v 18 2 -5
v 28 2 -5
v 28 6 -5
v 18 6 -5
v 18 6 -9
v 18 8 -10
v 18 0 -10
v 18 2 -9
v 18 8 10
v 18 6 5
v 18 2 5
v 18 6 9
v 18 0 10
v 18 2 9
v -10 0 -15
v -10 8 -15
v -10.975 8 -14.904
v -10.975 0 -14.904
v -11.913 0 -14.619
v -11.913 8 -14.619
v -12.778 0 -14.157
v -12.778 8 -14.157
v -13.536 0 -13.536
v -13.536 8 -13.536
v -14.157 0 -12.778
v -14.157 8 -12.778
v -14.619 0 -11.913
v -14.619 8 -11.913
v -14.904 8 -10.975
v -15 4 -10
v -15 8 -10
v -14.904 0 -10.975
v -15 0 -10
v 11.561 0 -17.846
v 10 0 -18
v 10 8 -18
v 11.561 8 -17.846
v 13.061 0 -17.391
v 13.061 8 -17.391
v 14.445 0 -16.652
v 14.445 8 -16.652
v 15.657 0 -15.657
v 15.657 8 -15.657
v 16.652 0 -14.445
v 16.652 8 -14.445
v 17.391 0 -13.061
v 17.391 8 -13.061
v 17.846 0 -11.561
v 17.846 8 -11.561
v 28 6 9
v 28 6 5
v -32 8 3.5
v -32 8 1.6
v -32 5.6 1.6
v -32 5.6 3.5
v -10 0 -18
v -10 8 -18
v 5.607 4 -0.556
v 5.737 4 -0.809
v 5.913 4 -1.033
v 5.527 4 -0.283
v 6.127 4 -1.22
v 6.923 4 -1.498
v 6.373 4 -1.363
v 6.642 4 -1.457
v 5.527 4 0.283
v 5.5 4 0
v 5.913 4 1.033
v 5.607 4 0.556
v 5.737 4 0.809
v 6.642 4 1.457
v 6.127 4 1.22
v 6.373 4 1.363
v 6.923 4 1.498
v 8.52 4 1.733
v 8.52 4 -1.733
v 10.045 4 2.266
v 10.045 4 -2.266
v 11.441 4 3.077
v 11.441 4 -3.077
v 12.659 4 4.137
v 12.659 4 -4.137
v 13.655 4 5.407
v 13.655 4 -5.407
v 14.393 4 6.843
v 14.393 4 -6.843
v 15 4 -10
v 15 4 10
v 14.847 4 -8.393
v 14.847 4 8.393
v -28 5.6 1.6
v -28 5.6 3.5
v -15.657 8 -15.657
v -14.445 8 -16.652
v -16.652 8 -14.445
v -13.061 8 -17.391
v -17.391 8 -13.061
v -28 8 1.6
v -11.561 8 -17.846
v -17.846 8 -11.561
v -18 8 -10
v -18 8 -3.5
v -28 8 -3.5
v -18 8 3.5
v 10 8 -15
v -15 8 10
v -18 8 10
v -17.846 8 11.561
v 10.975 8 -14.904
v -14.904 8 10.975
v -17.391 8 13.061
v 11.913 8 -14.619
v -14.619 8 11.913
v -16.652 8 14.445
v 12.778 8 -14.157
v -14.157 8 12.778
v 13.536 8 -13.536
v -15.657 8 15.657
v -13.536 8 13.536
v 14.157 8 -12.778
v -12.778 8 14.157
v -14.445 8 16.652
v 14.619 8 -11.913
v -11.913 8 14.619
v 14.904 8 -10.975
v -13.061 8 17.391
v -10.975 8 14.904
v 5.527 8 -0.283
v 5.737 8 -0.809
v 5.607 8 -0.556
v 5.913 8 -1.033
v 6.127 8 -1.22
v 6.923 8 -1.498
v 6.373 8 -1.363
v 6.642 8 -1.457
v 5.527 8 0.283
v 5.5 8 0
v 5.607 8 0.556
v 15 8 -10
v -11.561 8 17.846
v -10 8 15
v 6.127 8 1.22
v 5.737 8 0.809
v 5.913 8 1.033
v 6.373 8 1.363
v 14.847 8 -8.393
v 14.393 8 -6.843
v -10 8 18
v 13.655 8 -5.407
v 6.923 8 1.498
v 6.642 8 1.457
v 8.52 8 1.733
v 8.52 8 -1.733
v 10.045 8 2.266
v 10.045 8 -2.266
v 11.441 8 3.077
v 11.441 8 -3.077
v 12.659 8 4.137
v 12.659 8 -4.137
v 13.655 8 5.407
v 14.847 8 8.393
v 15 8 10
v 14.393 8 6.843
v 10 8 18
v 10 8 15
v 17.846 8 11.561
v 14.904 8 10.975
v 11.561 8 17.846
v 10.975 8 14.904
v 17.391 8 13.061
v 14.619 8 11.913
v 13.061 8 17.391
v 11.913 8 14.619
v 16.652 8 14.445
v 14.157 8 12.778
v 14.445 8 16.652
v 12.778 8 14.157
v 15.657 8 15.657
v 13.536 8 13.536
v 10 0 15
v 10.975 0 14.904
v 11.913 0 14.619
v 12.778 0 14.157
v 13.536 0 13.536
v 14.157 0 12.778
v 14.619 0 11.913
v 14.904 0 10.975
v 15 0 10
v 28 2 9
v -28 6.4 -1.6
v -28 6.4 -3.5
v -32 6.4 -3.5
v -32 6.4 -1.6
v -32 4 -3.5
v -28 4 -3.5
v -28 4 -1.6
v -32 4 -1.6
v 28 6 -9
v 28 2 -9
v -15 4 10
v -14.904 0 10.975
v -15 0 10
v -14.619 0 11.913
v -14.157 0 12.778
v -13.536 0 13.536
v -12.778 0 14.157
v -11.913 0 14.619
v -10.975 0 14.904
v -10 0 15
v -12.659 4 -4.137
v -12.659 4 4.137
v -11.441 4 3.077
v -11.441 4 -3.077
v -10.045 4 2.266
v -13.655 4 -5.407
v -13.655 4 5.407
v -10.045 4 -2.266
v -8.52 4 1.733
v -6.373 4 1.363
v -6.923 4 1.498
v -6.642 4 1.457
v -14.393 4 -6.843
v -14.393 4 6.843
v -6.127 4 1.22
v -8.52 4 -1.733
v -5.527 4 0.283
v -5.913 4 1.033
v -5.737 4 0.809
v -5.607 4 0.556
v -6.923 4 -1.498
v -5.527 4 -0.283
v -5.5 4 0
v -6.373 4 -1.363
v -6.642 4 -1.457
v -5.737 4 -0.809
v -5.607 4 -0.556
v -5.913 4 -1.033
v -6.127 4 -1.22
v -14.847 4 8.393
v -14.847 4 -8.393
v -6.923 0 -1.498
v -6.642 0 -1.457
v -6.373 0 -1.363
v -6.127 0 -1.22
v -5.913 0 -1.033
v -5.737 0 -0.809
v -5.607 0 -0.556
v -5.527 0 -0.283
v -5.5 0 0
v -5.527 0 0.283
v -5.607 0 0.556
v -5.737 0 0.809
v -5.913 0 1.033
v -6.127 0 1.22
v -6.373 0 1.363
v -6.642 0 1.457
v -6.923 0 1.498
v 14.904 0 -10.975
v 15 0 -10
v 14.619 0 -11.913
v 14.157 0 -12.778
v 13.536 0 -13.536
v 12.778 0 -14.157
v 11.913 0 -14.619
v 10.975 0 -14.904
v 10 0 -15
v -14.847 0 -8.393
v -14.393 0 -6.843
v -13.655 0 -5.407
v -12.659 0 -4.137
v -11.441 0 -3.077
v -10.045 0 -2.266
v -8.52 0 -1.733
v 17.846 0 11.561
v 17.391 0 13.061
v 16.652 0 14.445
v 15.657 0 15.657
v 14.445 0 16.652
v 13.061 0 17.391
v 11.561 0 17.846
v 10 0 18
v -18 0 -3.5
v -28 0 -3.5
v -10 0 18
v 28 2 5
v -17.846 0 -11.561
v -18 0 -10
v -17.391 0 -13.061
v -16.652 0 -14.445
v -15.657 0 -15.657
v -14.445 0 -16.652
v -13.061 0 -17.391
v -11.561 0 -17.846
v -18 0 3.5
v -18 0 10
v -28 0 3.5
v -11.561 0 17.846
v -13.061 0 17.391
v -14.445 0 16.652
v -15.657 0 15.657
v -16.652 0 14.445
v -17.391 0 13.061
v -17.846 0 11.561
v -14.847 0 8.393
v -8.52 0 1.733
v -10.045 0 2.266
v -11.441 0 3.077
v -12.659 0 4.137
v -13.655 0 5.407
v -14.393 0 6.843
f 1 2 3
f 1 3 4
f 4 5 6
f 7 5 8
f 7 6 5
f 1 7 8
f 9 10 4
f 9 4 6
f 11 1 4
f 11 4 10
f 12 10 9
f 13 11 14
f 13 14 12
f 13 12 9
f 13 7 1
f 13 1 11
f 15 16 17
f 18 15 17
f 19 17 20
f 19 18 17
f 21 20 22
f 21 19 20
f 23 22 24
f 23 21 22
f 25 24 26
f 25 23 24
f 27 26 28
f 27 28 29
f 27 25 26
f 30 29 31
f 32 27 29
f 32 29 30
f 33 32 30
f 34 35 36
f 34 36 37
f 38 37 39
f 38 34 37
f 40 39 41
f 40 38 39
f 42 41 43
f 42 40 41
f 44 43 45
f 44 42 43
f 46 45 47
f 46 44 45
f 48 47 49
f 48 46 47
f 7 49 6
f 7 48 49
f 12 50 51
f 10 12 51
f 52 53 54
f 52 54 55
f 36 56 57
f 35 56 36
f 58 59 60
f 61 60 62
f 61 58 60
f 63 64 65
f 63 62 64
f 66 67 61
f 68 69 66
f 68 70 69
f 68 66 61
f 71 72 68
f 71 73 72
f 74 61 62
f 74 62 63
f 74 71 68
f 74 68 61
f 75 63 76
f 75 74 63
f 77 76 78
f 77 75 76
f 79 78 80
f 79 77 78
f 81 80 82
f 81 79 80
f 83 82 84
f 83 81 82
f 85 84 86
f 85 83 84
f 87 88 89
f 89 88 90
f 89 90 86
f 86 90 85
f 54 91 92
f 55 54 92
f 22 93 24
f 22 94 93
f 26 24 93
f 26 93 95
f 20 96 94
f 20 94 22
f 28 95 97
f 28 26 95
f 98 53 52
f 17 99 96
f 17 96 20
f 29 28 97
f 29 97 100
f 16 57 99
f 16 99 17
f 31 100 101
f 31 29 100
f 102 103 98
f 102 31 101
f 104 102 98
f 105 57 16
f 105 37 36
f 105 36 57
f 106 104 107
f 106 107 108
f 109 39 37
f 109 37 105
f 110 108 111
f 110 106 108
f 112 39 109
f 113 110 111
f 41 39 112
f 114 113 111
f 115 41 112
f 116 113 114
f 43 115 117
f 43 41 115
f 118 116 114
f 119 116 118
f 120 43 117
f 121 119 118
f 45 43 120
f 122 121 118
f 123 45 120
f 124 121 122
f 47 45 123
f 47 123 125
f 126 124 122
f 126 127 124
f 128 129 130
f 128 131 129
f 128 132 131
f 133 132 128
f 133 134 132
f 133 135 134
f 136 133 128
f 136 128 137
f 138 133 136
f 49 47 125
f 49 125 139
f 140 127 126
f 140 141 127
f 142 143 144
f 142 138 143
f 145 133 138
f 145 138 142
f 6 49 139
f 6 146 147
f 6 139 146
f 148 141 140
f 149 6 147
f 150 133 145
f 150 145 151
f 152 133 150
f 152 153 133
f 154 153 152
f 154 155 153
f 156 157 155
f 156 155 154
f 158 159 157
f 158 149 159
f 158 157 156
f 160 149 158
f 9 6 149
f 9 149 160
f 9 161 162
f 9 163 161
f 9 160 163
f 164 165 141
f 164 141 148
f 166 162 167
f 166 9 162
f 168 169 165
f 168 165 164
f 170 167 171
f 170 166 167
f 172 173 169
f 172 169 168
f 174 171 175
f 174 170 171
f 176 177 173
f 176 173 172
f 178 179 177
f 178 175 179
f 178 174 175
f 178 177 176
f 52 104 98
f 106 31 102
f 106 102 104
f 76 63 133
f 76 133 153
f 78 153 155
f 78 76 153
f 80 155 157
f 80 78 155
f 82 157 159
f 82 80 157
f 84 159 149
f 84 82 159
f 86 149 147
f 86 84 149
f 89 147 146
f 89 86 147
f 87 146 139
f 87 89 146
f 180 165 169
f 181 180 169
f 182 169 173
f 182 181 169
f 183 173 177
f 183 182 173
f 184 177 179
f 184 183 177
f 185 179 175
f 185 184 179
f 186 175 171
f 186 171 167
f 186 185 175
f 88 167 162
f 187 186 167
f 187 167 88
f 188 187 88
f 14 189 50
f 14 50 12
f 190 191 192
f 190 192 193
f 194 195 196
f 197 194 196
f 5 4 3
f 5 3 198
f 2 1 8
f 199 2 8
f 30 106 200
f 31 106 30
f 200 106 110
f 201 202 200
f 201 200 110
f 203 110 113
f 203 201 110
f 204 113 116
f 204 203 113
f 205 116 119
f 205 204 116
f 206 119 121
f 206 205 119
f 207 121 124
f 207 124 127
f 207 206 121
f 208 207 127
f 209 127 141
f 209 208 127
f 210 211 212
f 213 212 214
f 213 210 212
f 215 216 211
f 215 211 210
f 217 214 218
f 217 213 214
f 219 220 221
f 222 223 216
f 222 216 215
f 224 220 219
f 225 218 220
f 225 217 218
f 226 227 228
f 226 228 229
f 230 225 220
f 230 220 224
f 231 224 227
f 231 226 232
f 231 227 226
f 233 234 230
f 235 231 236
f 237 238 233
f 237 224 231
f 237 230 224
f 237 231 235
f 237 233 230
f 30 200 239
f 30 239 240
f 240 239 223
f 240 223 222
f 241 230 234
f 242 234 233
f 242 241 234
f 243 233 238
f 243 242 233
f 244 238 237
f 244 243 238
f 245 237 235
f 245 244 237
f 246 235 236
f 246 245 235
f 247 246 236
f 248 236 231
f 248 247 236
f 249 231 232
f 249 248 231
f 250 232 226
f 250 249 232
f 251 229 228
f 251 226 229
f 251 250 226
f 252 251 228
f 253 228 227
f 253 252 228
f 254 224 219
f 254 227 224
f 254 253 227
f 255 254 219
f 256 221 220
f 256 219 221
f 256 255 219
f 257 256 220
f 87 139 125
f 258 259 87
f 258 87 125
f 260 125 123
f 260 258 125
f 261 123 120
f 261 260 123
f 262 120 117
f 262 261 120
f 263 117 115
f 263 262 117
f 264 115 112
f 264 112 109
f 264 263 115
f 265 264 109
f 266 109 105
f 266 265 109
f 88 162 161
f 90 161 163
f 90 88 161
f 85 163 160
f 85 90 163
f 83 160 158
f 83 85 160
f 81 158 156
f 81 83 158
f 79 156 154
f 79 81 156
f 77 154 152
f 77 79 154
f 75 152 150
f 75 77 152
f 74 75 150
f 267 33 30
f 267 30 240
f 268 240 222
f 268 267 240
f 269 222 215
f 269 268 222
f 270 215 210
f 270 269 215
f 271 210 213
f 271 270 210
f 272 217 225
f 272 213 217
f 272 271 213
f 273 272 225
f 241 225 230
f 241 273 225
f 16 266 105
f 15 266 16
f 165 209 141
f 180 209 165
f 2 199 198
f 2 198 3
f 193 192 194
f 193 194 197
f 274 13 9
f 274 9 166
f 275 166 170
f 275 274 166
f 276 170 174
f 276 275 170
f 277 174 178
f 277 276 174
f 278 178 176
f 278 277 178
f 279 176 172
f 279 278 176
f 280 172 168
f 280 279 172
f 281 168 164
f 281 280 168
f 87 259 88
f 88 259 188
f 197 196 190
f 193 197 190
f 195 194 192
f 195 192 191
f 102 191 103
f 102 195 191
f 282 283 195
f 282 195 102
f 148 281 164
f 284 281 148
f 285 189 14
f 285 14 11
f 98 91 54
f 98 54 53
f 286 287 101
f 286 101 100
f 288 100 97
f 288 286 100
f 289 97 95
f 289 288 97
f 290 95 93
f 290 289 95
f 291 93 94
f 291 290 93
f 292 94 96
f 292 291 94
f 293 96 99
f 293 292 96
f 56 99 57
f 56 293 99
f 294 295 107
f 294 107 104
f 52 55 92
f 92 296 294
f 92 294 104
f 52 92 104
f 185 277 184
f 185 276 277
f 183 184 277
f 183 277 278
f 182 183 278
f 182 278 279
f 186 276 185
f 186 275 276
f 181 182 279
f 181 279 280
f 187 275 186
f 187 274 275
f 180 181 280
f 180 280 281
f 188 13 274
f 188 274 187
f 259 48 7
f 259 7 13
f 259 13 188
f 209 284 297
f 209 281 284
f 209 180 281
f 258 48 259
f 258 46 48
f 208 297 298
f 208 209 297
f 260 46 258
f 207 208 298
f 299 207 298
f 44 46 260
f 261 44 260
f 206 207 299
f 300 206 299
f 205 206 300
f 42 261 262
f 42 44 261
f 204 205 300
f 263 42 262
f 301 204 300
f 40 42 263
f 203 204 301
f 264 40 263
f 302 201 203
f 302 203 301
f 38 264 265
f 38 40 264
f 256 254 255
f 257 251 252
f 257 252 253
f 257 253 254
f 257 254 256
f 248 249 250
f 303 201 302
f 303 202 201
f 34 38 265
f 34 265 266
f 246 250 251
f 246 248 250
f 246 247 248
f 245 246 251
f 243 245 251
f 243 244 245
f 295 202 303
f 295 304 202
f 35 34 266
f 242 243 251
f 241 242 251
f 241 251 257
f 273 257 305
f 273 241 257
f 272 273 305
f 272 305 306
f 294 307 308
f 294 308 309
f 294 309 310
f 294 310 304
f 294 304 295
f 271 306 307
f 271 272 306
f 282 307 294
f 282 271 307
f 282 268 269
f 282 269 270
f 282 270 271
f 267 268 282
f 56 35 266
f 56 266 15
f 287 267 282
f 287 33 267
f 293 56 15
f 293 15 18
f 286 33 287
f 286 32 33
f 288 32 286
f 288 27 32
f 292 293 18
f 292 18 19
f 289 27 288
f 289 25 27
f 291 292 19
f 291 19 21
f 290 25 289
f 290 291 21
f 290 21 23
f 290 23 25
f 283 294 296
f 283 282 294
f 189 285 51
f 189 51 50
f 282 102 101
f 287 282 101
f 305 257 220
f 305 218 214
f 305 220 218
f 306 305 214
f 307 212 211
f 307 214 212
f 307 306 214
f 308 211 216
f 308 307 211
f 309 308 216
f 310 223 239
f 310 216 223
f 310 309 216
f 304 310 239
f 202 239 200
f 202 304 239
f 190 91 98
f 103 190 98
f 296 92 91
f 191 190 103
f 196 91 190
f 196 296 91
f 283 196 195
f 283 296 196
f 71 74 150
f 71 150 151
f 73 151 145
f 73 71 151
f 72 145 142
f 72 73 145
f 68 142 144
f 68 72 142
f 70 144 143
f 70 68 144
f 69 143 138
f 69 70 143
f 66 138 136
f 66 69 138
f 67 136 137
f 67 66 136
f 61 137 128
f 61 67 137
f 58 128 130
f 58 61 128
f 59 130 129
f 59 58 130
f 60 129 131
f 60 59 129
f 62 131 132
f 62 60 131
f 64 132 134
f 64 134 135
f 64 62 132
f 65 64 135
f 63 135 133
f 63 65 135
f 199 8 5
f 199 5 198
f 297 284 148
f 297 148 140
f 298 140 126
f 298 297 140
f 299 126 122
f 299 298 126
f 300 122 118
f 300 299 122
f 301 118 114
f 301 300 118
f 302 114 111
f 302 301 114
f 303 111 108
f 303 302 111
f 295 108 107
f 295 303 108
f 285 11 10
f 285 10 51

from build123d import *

# Parameters (mm, degrees)
BOSS_EXTRUDE1_DEPTH = 8
SKETCH2_W           = 1.9
SKETCH2_H           = 2.4
BOSS_EXTRUDE2_DEPTH = 4
SKETCH3_W           = 18
SKETCH3_H           = 2
CUT_EXTRUDE1_DEPTH  = 10
SKETCH4_W           = 9.5
SKETCH4_H           = 20
CUT_EXTRUDE2_DEPTH  = 4
SKETCH5_W           = 9.5
SKETCH5_H           = 20
CUT_EXTRUDE3_DEPTH  = 4


with BuildPart() as part:
    # Sketch1 → Boss-Extrude1 (new body)
    with BuildSketch(Plane(origin=(0, 0, 0), x_dir=(1, 0, 0), z_dir=(0, 1, 0))):
        with BuildLine():
            Line((-18, -10), (-18, -3.5))
            Line((-18, -3.5), (-28, -3.5))
            Line((-28, -3.5), (-28, 3.5))
            Line((-28, 3.5), (-18, 3.5))
            Line((-18, 3.5), (-18, 10))
            ThreePointArc((-18, 10), (-15.656854249, 15.656854249), (-10, 18))
            Line((-10, 18), (10, 18))
            ThreePointArc((10, 18), (15.656854249, 15.656854249), (18, 10))
            Line((18, 10), (18, 9))
            Line((18, 9), (28, 9))
            Line((28, 9), (28, 5))
            Line((28, 5), (18, 5))
            Line((18, 5), (18, -5))
            Line((18, -5), (28, -5))
            Line((28, -5), (28, -9))
            Line((28, -9), (18, -9))
            Line((18, -9), (18, -10))
            ThreePointArc((18, -10), (15.656854249, -15.656854249), (10, -18))
            Line((10, -18), (-10, -18))
            ThreePointArc((-10, -18), (-15.656854249, -15.656854249), (-18, -10))
        make_face()
        with BuildLine():
            Line((-10, -15), (10, -15))
            ThreePointArc((10, -15), (13.535533906, -13.535533906), (15, -10))
            ThreePointArc((15, -10), (12.658876757, -4.136567081), (6.923127464, -1.498028909))
            ThreePointArc((6.923127464, -1.498028909), (5.5, 0), (6.923127464, 1.498028909))
            ThreePointArc((6.923127464, 1.498028909), (12.658876757, 4.136567081), (15, 10))
            ThreePointArc((15, 10), (13.535533906, 13.535533906), (10, 15))
            Line((10, 15), (-10, 15))
            ThreePointArc((-10, 15), (-13.535533906, 13.535533906), (-15, 10))
            ThreePointArc((-15, 10), (-12.658876757, 4.136567081), (-6.923127464, 1.498028909))
            ThreePointArc((-6.923127464, 1.498028909), (-5.5, 0), (-6.923127464, -1.498028909))
            ThreePointArc((-6.923127464, -1.498028909), (-12.658876757, -4.136567081), (-15, -10))
            ThreePointArc((-15, -10), (-13.535533906, -13.535533906), (-10, -15))
        make_face(mode=Mode.SUBTRACT)
    extrude(amount=BOSS_EXTRUDE1_DEPTH)

    # Sketch2 → Boss-Extrude2 (add)
    with BuildSketch(Plane.ZY.offset(28)):
        with Locations((2.55, 6.8)):
            Rectangle(SKETCH2_W, SKETCH2_H)
        with Locations((-2.55, 5.2)):
            Rectangle(SKETCH2_W, SKETCH2_H)
    extrude(amount=BOSS_EXTRUDE2_DEPTH)

    # Sketch3 → Cut-Extrude1 (cut)
    with BuildSketch(Plane(origin=(28, 0, 0), x_dir=(0, 0, -1), z_dir=(1, 0, 0))):
        with Locations((0, 1)):
            Rectangle(SKETCH3_W, SKETCH3_H)
        with Locations((0, 7)):
            Rectangle(SKETCH3_W, SKETCH3_H)
    extrude(amount=-CUT_EXTRUDE1_DEPTH, mode=Mode.SUBTRACT)

    # Sketch4 → Cut-Extrude2 (cut)
    with BuildSketch(Plane.XZ):
        with Locations((10.25, 0)):
            Rectangle(SKETCH4_W, SKETCH4_H)
    extrude(amount=-CUT_EXTRUDE2_DEPTH, mode=Mode.SUBTRACT)

    # Sketch5 → Cut-Extrude3 (cut)
    with BuildSketch(Plane(origin=(0, 8, 0), x_dir=(1, 0, 0), z_dir=(0, 1, 0))):
        with Locations((-10.25, 0)):
            Rectangle(SKETCH5_W, SKETCH5_H)
    extrude(amount=-CUT_EXTRUDE3_DEPTH, mode=Mode.SUBTRACT)


solid = part.part
